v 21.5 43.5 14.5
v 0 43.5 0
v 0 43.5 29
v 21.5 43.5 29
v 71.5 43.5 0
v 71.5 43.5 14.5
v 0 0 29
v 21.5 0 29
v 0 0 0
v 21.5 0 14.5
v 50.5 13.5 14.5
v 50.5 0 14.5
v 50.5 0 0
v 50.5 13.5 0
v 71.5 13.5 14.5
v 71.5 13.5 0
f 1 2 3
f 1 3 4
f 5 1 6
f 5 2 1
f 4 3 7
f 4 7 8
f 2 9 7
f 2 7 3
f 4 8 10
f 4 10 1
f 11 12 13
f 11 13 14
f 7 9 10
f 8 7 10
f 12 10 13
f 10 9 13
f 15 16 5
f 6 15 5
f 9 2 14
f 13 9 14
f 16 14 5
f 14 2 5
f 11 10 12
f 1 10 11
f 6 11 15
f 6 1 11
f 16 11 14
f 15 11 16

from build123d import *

# Parameters (mm, degrees)
F0_W     = 71.5
F0_H     = 43.5
F1_DEPTH = 29
F2_W     = 50
F2_H     = 43.5
F3_DEPTH = 14.5
F4_W     = 21
F4_H     = 13.5
F5_DEPTH = 14.501


with BuildPart() as f1:
    # F0 (on Top) → F1 (new body)
    with BuildSketch(Plane.XY):
        with Locations((35.75, 21.75)):
            Rectangle(F0_W, F0_H)
    extrude(amount=F1_DEPTH)

    # F2 (on face) → F3 (cut)
    with BuildSketch(Plane.XY.offset(29)):
        with Locations((46.5, 21.75)):
            Rectangle(F2_W, F2_H)
    extrude(amount=-F3_DEPTH, mode=Mode.SUBTRACT)

    # F4 (on face) → F5 (cut, through all)
    with BuildSketch(Plane.XY.offset(14.5)):
        with Locations((61, 6.75)):
            Rectangle(F4_W, F4_H)
    extrude(amount=-F5_DEPTH, mode=Mode.SUBTRACT)


solid = f1.part
